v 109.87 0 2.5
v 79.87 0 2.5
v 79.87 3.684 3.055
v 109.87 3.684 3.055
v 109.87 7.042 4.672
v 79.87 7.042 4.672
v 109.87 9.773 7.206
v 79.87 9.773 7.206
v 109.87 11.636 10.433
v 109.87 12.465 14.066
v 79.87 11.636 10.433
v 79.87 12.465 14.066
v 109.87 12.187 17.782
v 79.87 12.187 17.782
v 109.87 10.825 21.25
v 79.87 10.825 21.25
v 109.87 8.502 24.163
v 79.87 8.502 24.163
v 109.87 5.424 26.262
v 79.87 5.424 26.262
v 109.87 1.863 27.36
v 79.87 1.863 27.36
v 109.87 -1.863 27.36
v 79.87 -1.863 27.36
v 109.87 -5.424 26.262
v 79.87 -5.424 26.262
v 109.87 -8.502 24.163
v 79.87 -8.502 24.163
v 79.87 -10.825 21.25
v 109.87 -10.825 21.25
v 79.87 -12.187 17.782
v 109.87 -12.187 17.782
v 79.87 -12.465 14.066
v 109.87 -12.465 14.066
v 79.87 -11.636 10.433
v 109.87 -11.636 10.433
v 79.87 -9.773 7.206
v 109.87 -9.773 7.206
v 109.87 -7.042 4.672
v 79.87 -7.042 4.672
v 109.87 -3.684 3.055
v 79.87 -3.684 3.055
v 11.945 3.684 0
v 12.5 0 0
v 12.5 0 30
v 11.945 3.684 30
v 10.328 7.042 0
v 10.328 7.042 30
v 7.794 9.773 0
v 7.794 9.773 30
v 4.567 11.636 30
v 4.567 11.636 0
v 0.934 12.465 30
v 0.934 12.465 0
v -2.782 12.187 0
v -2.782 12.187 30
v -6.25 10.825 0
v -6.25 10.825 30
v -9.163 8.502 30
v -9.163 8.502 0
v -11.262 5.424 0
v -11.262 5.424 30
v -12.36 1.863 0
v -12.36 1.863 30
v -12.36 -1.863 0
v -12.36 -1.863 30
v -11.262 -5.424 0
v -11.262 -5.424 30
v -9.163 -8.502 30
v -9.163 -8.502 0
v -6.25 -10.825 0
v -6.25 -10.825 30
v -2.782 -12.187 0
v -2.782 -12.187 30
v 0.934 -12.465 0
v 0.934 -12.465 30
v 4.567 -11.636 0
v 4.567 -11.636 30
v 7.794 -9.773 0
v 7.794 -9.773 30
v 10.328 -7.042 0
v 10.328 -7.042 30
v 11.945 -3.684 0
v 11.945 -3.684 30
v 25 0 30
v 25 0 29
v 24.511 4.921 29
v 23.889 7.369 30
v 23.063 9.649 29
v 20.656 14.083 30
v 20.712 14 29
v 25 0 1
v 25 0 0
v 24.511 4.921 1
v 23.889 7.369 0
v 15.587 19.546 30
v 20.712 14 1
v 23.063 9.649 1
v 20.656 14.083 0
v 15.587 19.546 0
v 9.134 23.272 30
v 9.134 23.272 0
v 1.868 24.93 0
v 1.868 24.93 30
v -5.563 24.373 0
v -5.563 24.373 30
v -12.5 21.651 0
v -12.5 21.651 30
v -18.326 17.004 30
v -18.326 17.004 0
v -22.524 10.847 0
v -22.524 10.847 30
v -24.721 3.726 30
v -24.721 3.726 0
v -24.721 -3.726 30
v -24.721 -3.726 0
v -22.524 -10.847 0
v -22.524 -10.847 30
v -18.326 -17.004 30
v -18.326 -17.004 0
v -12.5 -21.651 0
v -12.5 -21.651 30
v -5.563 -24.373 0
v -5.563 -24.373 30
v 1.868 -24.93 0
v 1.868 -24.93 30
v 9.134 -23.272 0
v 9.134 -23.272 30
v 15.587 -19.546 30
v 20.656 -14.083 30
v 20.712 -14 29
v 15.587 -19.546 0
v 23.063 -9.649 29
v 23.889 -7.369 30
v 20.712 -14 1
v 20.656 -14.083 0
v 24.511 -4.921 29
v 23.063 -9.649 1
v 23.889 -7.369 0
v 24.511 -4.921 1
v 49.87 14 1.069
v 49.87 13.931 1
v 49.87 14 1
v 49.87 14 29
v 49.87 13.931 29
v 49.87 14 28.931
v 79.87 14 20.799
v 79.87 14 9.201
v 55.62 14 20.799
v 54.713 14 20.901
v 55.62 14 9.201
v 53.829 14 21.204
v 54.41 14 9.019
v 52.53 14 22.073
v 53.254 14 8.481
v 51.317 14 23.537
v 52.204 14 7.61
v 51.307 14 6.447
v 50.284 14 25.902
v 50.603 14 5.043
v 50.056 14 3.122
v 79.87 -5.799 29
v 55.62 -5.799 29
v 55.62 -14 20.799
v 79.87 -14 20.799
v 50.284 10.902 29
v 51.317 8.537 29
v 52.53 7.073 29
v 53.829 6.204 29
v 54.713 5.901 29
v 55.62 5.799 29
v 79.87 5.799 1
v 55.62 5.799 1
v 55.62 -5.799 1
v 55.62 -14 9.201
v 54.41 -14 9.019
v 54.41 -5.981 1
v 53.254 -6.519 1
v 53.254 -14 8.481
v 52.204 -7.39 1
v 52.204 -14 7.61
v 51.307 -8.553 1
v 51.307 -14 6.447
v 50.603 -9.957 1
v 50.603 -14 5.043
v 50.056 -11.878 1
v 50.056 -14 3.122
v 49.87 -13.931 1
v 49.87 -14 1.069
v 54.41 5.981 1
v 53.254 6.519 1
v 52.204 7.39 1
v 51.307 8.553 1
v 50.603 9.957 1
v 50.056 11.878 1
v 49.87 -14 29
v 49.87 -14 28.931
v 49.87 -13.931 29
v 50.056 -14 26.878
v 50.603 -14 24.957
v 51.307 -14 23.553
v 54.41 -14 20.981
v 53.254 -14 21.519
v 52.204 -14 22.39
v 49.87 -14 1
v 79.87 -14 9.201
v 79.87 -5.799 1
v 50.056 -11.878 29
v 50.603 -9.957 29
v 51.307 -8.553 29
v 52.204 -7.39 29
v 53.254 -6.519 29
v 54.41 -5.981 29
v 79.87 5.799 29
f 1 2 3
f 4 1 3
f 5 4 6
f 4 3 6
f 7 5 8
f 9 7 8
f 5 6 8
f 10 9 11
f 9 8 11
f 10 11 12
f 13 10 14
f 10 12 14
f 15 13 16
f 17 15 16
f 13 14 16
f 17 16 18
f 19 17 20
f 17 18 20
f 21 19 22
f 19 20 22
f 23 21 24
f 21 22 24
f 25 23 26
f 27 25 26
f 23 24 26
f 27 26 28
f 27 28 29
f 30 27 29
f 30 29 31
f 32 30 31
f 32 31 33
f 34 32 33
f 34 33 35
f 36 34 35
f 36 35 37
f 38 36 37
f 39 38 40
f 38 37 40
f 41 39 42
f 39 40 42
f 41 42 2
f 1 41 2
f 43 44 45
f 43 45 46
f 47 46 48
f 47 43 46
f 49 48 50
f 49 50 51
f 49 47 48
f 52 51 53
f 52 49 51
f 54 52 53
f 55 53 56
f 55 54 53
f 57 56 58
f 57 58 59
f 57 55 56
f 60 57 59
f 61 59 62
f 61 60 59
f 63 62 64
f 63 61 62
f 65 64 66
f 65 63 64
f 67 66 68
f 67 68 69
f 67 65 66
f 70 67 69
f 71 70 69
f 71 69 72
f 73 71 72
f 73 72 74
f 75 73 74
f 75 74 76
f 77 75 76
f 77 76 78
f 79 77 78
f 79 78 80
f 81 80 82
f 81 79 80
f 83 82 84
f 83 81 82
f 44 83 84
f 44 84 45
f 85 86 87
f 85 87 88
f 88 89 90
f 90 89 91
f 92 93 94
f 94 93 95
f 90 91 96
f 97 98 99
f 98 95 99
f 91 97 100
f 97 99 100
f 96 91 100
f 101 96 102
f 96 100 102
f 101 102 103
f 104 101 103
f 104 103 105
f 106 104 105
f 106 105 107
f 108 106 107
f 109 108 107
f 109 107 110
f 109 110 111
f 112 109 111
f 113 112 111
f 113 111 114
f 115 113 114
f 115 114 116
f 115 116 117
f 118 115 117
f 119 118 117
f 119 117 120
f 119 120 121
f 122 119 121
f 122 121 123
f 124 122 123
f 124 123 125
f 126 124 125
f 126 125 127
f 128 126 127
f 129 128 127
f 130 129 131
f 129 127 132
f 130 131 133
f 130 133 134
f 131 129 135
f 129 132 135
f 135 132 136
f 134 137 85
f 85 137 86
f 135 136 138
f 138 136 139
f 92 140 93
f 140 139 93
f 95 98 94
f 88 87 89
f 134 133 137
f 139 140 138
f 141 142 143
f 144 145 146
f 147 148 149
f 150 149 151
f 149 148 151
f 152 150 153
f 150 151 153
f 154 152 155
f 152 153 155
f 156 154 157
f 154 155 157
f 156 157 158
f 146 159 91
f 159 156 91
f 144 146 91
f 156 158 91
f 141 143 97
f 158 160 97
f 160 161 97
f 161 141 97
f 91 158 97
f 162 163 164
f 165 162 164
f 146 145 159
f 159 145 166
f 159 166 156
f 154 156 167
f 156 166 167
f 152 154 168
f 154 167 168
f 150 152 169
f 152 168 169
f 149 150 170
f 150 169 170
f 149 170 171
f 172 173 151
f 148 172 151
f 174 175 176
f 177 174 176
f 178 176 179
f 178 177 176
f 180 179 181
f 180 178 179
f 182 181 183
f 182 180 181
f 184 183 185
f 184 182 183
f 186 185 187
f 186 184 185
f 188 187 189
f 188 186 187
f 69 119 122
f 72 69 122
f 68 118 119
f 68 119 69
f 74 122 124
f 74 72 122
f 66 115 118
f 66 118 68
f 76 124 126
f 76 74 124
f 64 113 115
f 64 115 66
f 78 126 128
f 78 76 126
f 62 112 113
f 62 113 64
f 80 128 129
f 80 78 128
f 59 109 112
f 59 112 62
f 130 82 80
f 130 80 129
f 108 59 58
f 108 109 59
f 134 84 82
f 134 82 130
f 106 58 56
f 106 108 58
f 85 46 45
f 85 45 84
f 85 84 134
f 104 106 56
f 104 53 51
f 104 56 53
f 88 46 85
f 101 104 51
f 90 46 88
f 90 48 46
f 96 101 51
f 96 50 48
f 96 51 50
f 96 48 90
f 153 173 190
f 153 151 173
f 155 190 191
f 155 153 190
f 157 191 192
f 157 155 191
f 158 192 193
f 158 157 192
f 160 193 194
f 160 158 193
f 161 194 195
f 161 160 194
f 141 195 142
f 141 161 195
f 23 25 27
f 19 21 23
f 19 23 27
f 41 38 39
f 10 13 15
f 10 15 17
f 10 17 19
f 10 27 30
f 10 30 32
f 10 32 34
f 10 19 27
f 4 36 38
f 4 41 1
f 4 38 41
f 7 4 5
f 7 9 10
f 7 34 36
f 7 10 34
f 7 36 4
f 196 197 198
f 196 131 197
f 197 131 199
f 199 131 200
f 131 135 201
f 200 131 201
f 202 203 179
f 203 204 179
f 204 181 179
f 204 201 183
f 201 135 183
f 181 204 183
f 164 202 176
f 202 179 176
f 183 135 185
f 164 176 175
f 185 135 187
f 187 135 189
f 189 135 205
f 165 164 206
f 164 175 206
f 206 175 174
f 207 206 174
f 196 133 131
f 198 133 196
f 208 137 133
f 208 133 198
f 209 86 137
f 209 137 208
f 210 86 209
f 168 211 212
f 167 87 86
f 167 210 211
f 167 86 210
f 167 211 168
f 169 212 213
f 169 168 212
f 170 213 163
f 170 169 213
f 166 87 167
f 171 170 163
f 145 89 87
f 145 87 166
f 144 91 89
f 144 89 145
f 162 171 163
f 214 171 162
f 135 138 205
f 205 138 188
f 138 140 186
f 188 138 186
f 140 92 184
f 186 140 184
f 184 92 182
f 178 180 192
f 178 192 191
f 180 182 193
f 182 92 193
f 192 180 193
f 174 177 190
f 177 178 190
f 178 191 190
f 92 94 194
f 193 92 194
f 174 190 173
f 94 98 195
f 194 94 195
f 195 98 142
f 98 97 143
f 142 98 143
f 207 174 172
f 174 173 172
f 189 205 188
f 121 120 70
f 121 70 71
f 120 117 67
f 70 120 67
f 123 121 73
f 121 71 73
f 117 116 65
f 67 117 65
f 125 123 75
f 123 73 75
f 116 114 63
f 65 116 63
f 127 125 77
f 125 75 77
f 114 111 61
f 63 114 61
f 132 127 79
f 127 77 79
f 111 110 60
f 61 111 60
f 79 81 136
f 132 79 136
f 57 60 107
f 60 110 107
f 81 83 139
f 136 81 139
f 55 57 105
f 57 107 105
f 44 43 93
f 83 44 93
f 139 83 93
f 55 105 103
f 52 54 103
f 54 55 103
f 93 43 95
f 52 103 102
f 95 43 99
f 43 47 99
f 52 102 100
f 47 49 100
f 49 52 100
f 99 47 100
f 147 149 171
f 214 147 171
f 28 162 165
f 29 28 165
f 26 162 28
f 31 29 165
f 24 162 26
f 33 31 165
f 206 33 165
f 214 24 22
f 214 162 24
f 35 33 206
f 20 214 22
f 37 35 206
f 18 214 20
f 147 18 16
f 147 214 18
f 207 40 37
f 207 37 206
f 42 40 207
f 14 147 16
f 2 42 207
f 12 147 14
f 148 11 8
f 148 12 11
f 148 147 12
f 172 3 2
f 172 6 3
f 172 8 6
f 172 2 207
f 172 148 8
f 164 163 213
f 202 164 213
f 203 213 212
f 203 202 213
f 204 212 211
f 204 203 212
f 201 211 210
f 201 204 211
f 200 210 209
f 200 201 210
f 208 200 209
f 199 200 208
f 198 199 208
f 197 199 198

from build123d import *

# Parameters (mm, degrees)
SKETCH1_R           = 25
SKETCH1_R_2         = 12.5
BOSS_EXTRUDE1_DEPTH = 30
BOSS_EXTRUDE2_DEPTH = 14
BOSS_EXTRUDE5_DEPTH = 30
FILLET6_R           = 5.75
FILLET7_R           = 5.75
FILLET8_R           = 5.75
FILLET9_R           = 5.75
SKETCH7_R           = 12.5
BOSS_EXTRUDE6_DEPTH = 30


with BuildPart() as part:
    # Sketch1 → Boss-Extrude1 (new body)
    with BuildSketch(Plane.XY):
        Circle(SKETCH1_R)
        Circle(SKETCH1_R_2, mode=Mode.SUBTRACT)
    extrude(amount=BOSS_EXTRUDE1_DEPTH)

    # Sketch2 → Boss-Extrude2 (add, symmetric)
    with BuildSketch(Plane(origin=(0, 0, 15), x_dir=(-1, 0, 0), z_dir=(0, 0, -1))):
        with BuildLine():
            ThreePointArc((-20.712315177, 14), (-25, 0), (-20.712315177, -14))
            Line((-20.712315177, -14), (-49.87018371, -14))
            Line((-49.87018371, -14), (-49.87018371, 14))
            Line((-49.87018371, 14), (-20.712315177, 14))
        make_face()
    extrude(amount=BOSS_EXTRUDE2_DEPTH, both=True)

    # Sketch6 → Boss-Extrude5 (add)
    with BuildSketch(Plane(origin=(49.87018371, 0, 0), x_dir=(0, 0, -1), z_dir=(1, 0, 0))):
        Polygon((-9.201010127, 14), (-20.798989873, 14), (-29, 5.798989873), (-29, -5.798989873), (-20.798989873, -14), (-9.201010127, -14), (-1, -5.798989873), (-1, 5.798989873), align=None)
    extrude(amount=BOSS_EXTRUDE5_DEPTH)

    # Fillet6
    fillet6_edges = [part.edges().sort_by_distance(p)[0] for p in [
        (49.87018371, 9.899494937, 24.899494937),
    ]]
    fillet(fillet6_edges, radius=FILLET6_R)

    # Fillet7
    fillet7_edges = [part.edges().sort_by_distance(p)[0] for p in [
        (49.87018371, 9.899494937, 5.100505063),
    ]]
    fillet(fillet7_edges, radius=FILLET7_R)

    # Fillet8
    fillet8_edges = [part.edges().sort_by_distance(p)[0] for p in [
        (49.87018371, -9.899494937, 24.899494937),
    ]]
    fillet(fillet8_edges, radius=FILLET8_R)

    # Fillet9
    fillet9_edges = [part.edges().sort_by_distance(p)[0] for p in [
        (49.87018371, -9.899494937, 5.100505063),
    ]]
    fillet(fillet9_edges, radius=FILLET9_R)

    # Sketch7 → Boss-Extrude6 (add)
    with BuildSketch(Plane(origin=(79.87018371, 0, 0), x_dir=(0, 0, -1), z_dir=(1, 0, 0))):
        with Locations((-15, 0)):
            Circle(SKETCH7_R)
    extrude(amount=BOSS_EXTRUDE6_DEPTH)


solid = part.part
